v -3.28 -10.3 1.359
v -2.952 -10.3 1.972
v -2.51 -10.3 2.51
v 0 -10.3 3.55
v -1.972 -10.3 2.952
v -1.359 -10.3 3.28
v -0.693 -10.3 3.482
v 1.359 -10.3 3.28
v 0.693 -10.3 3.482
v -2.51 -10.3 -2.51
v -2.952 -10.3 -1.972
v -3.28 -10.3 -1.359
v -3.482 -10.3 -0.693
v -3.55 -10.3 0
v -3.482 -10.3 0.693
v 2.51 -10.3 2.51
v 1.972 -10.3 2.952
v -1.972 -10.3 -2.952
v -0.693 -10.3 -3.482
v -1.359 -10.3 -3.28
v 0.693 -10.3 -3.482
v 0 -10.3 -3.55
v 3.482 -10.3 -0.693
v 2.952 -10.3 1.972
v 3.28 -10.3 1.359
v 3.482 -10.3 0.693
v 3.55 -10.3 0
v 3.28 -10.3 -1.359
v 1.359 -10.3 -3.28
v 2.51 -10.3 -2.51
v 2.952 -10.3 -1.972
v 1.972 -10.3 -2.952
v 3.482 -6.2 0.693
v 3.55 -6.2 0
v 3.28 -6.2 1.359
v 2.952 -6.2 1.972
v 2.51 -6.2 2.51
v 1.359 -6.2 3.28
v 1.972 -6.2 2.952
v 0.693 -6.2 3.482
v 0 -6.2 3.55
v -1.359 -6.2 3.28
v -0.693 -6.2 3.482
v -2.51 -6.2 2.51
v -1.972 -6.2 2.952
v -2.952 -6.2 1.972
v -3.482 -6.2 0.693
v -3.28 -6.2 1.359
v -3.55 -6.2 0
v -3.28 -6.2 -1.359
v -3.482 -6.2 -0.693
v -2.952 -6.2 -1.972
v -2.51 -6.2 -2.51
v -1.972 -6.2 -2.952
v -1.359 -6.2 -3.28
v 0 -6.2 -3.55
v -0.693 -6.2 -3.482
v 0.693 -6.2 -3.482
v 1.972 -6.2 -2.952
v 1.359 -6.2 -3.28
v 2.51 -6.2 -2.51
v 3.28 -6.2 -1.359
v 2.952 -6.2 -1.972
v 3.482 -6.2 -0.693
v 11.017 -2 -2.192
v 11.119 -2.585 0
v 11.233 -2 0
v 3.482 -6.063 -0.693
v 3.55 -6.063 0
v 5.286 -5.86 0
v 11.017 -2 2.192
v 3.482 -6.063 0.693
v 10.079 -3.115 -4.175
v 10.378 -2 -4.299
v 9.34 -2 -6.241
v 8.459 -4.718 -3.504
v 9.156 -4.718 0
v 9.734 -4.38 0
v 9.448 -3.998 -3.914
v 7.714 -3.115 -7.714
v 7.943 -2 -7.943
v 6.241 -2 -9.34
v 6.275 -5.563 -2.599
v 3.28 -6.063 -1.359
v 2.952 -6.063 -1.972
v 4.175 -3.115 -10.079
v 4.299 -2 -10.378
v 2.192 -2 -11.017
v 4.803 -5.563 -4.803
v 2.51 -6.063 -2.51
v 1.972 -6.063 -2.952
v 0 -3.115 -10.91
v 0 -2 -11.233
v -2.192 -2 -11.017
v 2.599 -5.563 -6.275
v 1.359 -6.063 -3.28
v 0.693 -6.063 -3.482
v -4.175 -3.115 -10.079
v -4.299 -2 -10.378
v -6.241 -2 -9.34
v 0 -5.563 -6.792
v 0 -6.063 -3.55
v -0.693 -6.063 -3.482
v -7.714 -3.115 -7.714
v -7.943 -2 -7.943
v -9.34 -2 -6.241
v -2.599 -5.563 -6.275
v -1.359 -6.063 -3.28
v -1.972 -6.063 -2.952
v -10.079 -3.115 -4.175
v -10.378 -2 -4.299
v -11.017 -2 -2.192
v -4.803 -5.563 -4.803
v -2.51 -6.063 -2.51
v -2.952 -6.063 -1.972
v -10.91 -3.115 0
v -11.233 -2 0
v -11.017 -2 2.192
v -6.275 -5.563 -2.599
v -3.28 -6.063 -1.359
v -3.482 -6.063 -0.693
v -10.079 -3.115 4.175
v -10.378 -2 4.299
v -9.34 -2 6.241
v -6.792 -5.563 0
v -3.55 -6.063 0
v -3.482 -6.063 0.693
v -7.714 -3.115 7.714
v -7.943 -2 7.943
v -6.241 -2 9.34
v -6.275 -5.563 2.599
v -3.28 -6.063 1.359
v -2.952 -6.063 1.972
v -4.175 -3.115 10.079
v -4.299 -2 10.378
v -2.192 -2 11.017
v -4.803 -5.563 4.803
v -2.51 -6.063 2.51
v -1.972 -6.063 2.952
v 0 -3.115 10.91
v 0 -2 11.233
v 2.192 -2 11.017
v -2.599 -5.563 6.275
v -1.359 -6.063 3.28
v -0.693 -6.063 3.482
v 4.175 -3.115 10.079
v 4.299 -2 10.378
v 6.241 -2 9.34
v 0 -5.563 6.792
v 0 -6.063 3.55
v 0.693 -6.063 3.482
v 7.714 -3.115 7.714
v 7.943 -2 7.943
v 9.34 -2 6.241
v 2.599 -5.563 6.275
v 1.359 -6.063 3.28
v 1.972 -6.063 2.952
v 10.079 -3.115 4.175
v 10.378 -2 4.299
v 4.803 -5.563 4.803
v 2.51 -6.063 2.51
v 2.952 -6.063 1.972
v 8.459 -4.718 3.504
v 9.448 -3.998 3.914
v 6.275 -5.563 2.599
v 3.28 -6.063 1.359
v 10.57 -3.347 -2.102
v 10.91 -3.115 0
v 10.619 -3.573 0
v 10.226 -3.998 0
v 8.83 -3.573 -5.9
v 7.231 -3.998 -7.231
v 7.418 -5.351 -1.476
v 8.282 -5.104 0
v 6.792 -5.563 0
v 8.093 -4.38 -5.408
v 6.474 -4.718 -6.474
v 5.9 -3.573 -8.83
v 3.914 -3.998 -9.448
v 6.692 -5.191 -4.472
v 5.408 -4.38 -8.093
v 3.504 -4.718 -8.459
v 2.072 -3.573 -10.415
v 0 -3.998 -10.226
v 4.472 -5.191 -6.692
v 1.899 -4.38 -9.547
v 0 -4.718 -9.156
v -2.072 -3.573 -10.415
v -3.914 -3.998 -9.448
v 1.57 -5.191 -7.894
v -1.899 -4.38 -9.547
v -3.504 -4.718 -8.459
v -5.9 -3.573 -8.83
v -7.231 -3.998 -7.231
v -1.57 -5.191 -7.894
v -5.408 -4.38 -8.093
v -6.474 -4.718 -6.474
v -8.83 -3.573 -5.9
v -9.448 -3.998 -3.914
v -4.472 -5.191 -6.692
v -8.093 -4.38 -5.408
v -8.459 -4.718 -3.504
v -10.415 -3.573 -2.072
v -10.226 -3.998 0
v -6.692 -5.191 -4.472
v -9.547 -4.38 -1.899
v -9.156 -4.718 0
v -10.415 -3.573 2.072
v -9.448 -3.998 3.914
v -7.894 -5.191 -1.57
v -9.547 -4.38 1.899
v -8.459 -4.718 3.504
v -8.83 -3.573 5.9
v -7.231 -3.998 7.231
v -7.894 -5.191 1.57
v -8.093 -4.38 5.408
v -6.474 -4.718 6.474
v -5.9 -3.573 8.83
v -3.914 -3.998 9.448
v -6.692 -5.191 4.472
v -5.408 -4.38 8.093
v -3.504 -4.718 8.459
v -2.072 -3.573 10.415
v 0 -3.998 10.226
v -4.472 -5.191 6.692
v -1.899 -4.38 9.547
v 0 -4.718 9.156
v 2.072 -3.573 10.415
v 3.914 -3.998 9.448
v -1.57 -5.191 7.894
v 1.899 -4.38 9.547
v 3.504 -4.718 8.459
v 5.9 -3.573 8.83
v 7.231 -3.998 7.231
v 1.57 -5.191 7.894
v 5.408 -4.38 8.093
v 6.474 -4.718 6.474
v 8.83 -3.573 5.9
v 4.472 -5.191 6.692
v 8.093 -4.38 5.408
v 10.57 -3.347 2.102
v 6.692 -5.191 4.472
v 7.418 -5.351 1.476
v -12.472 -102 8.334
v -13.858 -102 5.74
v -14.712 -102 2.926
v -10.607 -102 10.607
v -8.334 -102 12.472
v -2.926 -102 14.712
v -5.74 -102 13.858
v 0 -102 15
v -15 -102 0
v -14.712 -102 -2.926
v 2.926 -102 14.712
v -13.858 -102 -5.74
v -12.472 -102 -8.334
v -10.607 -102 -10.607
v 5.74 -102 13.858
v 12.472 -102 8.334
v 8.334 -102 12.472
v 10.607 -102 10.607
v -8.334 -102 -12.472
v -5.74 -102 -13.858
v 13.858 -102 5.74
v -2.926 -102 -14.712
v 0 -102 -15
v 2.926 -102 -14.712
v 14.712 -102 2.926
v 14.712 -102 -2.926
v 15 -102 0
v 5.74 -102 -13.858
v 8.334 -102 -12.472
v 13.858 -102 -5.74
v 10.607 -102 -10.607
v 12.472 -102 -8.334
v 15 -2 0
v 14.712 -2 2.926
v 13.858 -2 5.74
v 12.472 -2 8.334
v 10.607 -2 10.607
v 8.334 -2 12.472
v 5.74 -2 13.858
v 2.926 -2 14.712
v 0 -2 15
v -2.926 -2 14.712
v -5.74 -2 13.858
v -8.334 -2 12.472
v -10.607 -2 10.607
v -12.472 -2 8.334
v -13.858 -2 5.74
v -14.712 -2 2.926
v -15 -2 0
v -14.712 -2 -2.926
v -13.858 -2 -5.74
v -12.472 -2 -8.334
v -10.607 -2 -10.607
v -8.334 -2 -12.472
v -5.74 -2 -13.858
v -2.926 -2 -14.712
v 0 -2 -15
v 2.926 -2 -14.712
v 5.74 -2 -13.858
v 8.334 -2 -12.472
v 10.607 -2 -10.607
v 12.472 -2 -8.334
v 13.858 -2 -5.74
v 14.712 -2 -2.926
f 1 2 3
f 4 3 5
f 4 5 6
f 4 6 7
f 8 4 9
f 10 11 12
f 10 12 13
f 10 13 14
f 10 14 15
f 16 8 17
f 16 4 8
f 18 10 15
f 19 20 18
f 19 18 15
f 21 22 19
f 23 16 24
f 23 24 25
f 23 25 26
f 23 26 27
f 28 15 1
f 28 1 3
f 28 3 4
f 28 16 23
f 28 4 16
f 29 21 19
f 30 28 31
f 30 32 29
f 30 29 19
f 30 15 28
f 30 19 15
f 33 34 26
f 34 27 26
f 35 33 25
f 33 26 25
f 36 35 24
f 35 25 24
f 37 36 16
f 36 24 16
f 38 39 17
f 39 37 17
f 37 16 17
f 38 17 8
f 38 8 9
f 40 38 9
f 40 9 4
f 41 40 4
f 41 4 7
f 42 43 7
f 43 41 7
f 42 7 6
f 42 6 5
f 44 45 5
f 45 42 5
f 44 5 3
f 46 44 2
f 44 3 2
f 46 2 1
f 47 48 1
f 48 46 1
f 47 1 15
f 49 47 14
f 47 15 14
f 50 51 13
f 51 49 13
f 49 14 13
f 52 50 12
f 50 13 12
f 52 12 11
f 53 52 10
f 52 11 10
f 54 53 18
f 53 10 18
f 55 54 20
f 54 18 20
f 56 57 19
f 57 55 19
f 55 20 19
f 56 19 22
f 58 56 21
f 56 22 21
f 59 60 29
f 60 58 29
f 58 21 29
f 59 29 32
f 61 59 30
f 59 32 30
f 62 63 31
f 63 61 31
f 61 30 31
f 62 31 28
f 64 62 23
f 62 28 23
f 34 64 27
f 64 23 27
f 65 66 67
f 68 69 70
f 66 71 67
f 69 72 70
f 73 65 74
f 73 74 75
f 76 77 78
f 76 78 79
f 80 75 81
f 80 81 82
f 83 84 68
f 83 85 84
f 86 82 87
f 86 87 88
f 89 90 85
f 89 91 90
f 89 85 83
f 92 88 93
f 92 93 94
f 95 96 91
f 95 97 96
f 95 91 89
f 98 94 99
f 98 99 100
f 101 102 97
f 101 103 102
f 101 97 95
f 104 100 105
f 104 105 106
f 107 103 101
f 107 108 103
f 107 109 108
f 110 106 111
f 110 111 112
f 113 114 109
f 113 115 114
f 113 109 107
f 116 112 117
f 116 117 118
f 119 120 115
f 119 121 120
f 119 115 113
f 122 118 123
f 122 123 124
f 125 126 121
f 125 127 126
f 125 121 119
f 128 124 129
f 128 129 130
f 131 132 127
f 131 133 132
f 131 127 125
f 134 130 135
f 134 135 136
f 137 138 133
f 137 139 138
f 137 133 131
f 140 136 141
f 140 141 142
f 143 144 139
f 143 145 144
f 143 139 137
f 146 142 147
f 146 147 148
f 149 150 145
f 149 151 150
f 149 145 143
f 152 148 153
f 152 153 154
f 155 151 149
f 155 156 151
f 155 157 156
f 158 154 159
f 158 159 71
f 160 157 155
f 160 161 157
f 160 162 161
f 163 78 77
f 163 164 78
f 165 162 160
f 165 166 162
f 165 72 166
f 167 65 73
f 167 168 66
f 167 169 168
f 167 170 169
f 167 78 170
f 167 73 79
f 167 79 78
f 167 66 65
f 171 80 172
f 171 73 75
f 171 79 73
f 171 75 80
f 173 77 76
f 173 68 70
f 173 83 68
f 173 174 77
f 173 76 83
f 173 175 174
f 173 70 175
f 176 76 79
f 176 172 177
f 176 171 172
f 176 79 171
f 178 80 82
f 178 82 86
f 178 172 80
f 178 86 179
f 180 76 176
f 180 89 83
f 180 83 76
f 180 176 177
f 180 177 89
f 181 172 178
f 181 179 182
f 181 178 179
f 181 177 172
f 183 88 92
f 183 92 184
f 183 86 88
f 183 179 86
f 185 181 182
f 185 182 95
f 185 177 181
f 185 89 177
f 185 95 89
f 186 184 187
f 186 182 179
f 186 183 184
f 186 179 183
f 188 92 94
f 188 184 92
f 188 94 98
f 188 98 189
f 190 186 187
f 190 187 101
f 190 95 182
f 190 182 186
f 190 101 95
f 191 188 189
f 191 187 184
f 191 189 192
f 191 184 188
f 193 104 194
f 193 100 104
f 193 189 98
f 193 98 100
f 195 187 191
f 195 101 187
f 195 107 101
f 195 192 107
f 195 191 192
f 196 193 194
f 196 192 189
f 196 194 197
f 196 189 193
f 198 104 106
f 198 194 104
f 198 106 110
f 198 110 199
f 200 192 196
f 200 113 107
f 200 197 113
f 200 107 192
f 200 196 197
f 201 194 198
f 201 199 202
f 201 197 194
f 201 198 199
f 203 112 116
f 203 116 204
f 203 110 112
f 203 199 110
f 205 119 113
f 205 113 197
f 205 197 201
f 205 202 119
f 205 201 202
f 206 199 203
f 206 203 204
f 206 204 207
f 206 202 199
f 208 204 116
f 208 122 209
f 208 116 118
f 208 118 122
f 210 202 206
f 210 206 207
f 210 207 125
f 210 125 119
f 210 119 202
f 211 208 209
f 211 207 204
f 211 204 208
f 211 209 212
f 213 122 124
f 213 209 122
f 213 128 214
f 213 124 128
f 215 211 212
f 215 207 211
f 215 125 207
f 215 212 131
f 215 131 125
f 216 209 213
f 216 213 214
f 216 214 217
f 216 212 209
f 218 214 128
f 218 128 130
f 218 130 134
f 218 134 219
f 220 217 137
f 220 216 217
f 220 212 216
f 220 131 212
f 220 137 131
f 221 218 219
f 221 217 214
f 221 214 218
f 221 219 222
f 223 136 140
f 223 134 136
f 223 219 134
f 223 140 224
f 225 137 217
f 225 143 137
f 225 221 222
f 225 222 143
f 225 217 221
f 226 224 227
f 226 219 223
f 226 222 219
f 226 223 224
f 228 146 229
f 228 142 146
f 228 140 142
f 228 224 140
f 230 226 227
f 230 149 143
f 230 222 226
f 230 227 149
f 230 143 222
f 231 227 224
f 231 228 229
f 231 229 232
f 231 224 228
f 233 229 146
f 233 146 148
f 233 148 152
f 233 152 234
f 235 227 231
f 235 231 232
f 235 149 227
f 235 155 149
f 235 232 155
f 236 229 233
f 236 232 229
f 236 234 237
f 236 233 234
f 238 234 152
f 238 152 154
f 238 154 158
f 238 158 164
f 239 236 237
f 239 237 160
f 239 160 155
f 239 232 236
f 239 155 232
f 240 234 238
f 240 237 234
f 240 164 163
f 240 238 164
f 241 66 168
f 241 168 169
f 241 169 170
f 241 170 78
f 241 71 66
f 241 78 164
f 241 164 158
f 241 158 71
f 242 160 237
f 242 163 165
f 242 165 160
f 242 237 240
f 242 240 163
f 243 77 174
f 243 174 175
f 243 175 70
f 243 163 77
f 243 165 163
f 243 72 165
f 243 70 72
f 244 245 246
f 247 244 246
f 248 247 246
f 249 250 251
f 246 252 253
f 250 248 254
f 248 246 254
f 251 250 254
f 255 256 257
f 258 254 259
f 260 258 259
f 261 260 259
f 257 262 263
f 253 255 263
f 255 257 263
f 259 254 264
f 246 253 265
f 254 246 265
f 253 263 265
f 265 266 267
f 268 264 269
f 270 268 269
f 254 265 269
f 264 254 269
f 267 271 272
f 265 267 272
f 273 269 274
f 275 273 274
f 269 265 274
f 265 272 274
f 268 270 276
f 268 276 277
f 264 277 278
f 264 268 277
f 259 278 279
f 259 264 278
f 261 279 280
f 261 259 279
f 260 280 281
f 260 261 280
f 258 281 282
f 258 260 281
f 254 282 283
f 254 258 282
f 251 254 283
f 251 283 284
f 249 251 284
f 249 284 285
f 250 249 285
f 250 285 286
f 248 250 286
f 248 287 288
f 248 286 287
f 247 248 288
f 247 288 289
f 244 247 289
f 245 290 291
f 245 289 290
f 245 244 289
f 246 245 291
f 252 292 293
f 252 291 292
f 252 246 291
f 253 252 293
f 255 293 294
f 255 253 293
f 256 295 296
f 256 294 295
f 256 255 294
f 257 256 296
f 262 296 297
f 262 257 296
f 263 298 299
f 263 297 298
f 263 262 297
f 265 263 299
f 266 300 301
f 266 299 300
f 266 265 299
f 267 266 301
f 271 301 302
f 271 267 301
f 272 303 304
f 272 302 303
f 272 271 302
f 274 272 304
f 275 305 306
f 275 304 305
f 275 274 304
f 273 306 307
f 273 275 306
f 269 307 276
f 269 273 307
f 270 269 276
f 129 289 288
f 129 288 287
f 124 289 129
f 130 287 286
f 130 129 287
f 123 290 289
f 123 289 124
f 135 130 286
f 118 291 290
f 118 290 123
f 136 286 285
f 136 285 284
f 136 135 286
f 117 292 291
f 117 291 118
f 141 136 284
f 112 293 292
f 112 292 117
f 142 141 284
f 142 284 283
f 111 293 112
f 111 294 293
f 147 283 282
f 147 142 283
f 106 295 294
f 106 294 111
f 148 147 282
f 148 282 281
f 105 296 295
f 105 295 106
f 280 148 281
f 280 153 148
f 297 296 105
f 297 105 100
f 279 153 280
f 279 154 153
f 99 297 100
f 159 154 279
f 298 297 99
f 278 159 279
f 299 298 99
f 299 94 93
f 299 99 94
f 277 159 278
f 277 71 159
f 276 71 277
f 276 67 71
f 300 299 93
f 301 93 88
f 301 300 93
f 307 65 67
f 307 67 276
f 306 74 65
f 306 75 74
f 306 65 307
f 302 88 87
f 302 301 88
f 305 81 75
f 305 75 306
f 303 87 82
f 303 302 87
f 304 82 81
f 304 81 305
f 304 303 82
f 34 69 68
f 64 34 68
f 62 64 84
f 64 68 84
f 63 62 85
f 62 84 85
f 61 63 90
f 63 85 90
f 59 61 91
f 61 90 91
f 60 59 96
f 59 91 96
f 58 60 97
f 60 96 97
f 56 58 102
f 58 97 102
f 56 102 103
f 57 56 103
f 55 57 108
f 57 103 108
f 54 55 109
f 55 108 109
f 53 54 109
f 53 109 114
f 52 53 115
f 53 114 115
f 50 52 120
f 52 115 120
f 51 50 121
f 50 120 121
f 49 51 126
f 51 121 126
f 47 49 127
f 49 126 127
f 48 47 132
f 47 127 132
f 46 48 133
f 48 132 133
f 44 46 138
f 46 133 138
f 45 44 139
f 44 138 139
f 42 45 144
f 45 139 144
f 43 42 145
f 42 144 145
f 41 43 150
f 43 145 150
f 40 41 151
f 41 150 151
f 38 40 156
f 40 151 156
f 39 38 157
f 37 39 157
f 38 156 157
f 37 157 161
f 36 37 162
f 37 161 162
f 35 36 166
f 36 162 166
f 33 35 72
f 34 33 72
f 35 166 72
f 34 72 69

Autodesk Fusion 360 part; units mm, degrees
sketch "Sketch1" plane through (0, 0, 0) normal (0, 0, 1) x (1, 0, 0)
  line L0 (11.2333, -2) -> (15, -2)
  line L1 (15, -2) -> (15, -102)
  line L2 (15, -102) -> (0, -102)
  line L3 (0, -102) -> (0, -10.3)
  line L4 (3.55, -6.2) -> (3.55, -10.3)
  line L5 (3.55, -10.3) -> (0, -10.3)
  line L6 (3.55, -6.2) -> (3.55, -6.0626)
  spline S0 degree 5 poles (0.0005, -6.2) (0.0004, -6.2) (0.0003, -6.2) (0.0002, -6.2) (0.0001, -6.2) (0, -6.2) knots 0.999983 0.999983 0.999983 0.999983 0.999983 0.999983 1 1 1 1 1 1
  spline S1 degree 5 poles (11.2333, -2) (11.2207, -2.1206) (11.1821, -2.3832) (11.0805, -2.7956) (10.8375, -3.3499) (10.3193, -3.992) (9.5498, -4.5477) (8.6121, -5.0047) (7.56, -5.3794) (6.3963, -5.6787) (5.3546, -5.8645) (4.4953, -5.9743) (3.8803, -6.0347) (3.558, -6.0619) (3.55, -6.0626) knots 0.274949 0.274949 0.274949 0.274949 0.274949 0.274949 0.333333 0.4 0.466667 0.533333 0.6 0.666667 0.733333 0.8 0.866667 0.86836 0.86836 0.86836 0.86836 0.86836 0.86836
  dimension "d4" = 3.55
  dimension "d5" = 4.1
revolve "Revolve1" add sketch "Sketch1" angle 360 about axis through (0, 1.75, 0) along (0, 1, 0)
